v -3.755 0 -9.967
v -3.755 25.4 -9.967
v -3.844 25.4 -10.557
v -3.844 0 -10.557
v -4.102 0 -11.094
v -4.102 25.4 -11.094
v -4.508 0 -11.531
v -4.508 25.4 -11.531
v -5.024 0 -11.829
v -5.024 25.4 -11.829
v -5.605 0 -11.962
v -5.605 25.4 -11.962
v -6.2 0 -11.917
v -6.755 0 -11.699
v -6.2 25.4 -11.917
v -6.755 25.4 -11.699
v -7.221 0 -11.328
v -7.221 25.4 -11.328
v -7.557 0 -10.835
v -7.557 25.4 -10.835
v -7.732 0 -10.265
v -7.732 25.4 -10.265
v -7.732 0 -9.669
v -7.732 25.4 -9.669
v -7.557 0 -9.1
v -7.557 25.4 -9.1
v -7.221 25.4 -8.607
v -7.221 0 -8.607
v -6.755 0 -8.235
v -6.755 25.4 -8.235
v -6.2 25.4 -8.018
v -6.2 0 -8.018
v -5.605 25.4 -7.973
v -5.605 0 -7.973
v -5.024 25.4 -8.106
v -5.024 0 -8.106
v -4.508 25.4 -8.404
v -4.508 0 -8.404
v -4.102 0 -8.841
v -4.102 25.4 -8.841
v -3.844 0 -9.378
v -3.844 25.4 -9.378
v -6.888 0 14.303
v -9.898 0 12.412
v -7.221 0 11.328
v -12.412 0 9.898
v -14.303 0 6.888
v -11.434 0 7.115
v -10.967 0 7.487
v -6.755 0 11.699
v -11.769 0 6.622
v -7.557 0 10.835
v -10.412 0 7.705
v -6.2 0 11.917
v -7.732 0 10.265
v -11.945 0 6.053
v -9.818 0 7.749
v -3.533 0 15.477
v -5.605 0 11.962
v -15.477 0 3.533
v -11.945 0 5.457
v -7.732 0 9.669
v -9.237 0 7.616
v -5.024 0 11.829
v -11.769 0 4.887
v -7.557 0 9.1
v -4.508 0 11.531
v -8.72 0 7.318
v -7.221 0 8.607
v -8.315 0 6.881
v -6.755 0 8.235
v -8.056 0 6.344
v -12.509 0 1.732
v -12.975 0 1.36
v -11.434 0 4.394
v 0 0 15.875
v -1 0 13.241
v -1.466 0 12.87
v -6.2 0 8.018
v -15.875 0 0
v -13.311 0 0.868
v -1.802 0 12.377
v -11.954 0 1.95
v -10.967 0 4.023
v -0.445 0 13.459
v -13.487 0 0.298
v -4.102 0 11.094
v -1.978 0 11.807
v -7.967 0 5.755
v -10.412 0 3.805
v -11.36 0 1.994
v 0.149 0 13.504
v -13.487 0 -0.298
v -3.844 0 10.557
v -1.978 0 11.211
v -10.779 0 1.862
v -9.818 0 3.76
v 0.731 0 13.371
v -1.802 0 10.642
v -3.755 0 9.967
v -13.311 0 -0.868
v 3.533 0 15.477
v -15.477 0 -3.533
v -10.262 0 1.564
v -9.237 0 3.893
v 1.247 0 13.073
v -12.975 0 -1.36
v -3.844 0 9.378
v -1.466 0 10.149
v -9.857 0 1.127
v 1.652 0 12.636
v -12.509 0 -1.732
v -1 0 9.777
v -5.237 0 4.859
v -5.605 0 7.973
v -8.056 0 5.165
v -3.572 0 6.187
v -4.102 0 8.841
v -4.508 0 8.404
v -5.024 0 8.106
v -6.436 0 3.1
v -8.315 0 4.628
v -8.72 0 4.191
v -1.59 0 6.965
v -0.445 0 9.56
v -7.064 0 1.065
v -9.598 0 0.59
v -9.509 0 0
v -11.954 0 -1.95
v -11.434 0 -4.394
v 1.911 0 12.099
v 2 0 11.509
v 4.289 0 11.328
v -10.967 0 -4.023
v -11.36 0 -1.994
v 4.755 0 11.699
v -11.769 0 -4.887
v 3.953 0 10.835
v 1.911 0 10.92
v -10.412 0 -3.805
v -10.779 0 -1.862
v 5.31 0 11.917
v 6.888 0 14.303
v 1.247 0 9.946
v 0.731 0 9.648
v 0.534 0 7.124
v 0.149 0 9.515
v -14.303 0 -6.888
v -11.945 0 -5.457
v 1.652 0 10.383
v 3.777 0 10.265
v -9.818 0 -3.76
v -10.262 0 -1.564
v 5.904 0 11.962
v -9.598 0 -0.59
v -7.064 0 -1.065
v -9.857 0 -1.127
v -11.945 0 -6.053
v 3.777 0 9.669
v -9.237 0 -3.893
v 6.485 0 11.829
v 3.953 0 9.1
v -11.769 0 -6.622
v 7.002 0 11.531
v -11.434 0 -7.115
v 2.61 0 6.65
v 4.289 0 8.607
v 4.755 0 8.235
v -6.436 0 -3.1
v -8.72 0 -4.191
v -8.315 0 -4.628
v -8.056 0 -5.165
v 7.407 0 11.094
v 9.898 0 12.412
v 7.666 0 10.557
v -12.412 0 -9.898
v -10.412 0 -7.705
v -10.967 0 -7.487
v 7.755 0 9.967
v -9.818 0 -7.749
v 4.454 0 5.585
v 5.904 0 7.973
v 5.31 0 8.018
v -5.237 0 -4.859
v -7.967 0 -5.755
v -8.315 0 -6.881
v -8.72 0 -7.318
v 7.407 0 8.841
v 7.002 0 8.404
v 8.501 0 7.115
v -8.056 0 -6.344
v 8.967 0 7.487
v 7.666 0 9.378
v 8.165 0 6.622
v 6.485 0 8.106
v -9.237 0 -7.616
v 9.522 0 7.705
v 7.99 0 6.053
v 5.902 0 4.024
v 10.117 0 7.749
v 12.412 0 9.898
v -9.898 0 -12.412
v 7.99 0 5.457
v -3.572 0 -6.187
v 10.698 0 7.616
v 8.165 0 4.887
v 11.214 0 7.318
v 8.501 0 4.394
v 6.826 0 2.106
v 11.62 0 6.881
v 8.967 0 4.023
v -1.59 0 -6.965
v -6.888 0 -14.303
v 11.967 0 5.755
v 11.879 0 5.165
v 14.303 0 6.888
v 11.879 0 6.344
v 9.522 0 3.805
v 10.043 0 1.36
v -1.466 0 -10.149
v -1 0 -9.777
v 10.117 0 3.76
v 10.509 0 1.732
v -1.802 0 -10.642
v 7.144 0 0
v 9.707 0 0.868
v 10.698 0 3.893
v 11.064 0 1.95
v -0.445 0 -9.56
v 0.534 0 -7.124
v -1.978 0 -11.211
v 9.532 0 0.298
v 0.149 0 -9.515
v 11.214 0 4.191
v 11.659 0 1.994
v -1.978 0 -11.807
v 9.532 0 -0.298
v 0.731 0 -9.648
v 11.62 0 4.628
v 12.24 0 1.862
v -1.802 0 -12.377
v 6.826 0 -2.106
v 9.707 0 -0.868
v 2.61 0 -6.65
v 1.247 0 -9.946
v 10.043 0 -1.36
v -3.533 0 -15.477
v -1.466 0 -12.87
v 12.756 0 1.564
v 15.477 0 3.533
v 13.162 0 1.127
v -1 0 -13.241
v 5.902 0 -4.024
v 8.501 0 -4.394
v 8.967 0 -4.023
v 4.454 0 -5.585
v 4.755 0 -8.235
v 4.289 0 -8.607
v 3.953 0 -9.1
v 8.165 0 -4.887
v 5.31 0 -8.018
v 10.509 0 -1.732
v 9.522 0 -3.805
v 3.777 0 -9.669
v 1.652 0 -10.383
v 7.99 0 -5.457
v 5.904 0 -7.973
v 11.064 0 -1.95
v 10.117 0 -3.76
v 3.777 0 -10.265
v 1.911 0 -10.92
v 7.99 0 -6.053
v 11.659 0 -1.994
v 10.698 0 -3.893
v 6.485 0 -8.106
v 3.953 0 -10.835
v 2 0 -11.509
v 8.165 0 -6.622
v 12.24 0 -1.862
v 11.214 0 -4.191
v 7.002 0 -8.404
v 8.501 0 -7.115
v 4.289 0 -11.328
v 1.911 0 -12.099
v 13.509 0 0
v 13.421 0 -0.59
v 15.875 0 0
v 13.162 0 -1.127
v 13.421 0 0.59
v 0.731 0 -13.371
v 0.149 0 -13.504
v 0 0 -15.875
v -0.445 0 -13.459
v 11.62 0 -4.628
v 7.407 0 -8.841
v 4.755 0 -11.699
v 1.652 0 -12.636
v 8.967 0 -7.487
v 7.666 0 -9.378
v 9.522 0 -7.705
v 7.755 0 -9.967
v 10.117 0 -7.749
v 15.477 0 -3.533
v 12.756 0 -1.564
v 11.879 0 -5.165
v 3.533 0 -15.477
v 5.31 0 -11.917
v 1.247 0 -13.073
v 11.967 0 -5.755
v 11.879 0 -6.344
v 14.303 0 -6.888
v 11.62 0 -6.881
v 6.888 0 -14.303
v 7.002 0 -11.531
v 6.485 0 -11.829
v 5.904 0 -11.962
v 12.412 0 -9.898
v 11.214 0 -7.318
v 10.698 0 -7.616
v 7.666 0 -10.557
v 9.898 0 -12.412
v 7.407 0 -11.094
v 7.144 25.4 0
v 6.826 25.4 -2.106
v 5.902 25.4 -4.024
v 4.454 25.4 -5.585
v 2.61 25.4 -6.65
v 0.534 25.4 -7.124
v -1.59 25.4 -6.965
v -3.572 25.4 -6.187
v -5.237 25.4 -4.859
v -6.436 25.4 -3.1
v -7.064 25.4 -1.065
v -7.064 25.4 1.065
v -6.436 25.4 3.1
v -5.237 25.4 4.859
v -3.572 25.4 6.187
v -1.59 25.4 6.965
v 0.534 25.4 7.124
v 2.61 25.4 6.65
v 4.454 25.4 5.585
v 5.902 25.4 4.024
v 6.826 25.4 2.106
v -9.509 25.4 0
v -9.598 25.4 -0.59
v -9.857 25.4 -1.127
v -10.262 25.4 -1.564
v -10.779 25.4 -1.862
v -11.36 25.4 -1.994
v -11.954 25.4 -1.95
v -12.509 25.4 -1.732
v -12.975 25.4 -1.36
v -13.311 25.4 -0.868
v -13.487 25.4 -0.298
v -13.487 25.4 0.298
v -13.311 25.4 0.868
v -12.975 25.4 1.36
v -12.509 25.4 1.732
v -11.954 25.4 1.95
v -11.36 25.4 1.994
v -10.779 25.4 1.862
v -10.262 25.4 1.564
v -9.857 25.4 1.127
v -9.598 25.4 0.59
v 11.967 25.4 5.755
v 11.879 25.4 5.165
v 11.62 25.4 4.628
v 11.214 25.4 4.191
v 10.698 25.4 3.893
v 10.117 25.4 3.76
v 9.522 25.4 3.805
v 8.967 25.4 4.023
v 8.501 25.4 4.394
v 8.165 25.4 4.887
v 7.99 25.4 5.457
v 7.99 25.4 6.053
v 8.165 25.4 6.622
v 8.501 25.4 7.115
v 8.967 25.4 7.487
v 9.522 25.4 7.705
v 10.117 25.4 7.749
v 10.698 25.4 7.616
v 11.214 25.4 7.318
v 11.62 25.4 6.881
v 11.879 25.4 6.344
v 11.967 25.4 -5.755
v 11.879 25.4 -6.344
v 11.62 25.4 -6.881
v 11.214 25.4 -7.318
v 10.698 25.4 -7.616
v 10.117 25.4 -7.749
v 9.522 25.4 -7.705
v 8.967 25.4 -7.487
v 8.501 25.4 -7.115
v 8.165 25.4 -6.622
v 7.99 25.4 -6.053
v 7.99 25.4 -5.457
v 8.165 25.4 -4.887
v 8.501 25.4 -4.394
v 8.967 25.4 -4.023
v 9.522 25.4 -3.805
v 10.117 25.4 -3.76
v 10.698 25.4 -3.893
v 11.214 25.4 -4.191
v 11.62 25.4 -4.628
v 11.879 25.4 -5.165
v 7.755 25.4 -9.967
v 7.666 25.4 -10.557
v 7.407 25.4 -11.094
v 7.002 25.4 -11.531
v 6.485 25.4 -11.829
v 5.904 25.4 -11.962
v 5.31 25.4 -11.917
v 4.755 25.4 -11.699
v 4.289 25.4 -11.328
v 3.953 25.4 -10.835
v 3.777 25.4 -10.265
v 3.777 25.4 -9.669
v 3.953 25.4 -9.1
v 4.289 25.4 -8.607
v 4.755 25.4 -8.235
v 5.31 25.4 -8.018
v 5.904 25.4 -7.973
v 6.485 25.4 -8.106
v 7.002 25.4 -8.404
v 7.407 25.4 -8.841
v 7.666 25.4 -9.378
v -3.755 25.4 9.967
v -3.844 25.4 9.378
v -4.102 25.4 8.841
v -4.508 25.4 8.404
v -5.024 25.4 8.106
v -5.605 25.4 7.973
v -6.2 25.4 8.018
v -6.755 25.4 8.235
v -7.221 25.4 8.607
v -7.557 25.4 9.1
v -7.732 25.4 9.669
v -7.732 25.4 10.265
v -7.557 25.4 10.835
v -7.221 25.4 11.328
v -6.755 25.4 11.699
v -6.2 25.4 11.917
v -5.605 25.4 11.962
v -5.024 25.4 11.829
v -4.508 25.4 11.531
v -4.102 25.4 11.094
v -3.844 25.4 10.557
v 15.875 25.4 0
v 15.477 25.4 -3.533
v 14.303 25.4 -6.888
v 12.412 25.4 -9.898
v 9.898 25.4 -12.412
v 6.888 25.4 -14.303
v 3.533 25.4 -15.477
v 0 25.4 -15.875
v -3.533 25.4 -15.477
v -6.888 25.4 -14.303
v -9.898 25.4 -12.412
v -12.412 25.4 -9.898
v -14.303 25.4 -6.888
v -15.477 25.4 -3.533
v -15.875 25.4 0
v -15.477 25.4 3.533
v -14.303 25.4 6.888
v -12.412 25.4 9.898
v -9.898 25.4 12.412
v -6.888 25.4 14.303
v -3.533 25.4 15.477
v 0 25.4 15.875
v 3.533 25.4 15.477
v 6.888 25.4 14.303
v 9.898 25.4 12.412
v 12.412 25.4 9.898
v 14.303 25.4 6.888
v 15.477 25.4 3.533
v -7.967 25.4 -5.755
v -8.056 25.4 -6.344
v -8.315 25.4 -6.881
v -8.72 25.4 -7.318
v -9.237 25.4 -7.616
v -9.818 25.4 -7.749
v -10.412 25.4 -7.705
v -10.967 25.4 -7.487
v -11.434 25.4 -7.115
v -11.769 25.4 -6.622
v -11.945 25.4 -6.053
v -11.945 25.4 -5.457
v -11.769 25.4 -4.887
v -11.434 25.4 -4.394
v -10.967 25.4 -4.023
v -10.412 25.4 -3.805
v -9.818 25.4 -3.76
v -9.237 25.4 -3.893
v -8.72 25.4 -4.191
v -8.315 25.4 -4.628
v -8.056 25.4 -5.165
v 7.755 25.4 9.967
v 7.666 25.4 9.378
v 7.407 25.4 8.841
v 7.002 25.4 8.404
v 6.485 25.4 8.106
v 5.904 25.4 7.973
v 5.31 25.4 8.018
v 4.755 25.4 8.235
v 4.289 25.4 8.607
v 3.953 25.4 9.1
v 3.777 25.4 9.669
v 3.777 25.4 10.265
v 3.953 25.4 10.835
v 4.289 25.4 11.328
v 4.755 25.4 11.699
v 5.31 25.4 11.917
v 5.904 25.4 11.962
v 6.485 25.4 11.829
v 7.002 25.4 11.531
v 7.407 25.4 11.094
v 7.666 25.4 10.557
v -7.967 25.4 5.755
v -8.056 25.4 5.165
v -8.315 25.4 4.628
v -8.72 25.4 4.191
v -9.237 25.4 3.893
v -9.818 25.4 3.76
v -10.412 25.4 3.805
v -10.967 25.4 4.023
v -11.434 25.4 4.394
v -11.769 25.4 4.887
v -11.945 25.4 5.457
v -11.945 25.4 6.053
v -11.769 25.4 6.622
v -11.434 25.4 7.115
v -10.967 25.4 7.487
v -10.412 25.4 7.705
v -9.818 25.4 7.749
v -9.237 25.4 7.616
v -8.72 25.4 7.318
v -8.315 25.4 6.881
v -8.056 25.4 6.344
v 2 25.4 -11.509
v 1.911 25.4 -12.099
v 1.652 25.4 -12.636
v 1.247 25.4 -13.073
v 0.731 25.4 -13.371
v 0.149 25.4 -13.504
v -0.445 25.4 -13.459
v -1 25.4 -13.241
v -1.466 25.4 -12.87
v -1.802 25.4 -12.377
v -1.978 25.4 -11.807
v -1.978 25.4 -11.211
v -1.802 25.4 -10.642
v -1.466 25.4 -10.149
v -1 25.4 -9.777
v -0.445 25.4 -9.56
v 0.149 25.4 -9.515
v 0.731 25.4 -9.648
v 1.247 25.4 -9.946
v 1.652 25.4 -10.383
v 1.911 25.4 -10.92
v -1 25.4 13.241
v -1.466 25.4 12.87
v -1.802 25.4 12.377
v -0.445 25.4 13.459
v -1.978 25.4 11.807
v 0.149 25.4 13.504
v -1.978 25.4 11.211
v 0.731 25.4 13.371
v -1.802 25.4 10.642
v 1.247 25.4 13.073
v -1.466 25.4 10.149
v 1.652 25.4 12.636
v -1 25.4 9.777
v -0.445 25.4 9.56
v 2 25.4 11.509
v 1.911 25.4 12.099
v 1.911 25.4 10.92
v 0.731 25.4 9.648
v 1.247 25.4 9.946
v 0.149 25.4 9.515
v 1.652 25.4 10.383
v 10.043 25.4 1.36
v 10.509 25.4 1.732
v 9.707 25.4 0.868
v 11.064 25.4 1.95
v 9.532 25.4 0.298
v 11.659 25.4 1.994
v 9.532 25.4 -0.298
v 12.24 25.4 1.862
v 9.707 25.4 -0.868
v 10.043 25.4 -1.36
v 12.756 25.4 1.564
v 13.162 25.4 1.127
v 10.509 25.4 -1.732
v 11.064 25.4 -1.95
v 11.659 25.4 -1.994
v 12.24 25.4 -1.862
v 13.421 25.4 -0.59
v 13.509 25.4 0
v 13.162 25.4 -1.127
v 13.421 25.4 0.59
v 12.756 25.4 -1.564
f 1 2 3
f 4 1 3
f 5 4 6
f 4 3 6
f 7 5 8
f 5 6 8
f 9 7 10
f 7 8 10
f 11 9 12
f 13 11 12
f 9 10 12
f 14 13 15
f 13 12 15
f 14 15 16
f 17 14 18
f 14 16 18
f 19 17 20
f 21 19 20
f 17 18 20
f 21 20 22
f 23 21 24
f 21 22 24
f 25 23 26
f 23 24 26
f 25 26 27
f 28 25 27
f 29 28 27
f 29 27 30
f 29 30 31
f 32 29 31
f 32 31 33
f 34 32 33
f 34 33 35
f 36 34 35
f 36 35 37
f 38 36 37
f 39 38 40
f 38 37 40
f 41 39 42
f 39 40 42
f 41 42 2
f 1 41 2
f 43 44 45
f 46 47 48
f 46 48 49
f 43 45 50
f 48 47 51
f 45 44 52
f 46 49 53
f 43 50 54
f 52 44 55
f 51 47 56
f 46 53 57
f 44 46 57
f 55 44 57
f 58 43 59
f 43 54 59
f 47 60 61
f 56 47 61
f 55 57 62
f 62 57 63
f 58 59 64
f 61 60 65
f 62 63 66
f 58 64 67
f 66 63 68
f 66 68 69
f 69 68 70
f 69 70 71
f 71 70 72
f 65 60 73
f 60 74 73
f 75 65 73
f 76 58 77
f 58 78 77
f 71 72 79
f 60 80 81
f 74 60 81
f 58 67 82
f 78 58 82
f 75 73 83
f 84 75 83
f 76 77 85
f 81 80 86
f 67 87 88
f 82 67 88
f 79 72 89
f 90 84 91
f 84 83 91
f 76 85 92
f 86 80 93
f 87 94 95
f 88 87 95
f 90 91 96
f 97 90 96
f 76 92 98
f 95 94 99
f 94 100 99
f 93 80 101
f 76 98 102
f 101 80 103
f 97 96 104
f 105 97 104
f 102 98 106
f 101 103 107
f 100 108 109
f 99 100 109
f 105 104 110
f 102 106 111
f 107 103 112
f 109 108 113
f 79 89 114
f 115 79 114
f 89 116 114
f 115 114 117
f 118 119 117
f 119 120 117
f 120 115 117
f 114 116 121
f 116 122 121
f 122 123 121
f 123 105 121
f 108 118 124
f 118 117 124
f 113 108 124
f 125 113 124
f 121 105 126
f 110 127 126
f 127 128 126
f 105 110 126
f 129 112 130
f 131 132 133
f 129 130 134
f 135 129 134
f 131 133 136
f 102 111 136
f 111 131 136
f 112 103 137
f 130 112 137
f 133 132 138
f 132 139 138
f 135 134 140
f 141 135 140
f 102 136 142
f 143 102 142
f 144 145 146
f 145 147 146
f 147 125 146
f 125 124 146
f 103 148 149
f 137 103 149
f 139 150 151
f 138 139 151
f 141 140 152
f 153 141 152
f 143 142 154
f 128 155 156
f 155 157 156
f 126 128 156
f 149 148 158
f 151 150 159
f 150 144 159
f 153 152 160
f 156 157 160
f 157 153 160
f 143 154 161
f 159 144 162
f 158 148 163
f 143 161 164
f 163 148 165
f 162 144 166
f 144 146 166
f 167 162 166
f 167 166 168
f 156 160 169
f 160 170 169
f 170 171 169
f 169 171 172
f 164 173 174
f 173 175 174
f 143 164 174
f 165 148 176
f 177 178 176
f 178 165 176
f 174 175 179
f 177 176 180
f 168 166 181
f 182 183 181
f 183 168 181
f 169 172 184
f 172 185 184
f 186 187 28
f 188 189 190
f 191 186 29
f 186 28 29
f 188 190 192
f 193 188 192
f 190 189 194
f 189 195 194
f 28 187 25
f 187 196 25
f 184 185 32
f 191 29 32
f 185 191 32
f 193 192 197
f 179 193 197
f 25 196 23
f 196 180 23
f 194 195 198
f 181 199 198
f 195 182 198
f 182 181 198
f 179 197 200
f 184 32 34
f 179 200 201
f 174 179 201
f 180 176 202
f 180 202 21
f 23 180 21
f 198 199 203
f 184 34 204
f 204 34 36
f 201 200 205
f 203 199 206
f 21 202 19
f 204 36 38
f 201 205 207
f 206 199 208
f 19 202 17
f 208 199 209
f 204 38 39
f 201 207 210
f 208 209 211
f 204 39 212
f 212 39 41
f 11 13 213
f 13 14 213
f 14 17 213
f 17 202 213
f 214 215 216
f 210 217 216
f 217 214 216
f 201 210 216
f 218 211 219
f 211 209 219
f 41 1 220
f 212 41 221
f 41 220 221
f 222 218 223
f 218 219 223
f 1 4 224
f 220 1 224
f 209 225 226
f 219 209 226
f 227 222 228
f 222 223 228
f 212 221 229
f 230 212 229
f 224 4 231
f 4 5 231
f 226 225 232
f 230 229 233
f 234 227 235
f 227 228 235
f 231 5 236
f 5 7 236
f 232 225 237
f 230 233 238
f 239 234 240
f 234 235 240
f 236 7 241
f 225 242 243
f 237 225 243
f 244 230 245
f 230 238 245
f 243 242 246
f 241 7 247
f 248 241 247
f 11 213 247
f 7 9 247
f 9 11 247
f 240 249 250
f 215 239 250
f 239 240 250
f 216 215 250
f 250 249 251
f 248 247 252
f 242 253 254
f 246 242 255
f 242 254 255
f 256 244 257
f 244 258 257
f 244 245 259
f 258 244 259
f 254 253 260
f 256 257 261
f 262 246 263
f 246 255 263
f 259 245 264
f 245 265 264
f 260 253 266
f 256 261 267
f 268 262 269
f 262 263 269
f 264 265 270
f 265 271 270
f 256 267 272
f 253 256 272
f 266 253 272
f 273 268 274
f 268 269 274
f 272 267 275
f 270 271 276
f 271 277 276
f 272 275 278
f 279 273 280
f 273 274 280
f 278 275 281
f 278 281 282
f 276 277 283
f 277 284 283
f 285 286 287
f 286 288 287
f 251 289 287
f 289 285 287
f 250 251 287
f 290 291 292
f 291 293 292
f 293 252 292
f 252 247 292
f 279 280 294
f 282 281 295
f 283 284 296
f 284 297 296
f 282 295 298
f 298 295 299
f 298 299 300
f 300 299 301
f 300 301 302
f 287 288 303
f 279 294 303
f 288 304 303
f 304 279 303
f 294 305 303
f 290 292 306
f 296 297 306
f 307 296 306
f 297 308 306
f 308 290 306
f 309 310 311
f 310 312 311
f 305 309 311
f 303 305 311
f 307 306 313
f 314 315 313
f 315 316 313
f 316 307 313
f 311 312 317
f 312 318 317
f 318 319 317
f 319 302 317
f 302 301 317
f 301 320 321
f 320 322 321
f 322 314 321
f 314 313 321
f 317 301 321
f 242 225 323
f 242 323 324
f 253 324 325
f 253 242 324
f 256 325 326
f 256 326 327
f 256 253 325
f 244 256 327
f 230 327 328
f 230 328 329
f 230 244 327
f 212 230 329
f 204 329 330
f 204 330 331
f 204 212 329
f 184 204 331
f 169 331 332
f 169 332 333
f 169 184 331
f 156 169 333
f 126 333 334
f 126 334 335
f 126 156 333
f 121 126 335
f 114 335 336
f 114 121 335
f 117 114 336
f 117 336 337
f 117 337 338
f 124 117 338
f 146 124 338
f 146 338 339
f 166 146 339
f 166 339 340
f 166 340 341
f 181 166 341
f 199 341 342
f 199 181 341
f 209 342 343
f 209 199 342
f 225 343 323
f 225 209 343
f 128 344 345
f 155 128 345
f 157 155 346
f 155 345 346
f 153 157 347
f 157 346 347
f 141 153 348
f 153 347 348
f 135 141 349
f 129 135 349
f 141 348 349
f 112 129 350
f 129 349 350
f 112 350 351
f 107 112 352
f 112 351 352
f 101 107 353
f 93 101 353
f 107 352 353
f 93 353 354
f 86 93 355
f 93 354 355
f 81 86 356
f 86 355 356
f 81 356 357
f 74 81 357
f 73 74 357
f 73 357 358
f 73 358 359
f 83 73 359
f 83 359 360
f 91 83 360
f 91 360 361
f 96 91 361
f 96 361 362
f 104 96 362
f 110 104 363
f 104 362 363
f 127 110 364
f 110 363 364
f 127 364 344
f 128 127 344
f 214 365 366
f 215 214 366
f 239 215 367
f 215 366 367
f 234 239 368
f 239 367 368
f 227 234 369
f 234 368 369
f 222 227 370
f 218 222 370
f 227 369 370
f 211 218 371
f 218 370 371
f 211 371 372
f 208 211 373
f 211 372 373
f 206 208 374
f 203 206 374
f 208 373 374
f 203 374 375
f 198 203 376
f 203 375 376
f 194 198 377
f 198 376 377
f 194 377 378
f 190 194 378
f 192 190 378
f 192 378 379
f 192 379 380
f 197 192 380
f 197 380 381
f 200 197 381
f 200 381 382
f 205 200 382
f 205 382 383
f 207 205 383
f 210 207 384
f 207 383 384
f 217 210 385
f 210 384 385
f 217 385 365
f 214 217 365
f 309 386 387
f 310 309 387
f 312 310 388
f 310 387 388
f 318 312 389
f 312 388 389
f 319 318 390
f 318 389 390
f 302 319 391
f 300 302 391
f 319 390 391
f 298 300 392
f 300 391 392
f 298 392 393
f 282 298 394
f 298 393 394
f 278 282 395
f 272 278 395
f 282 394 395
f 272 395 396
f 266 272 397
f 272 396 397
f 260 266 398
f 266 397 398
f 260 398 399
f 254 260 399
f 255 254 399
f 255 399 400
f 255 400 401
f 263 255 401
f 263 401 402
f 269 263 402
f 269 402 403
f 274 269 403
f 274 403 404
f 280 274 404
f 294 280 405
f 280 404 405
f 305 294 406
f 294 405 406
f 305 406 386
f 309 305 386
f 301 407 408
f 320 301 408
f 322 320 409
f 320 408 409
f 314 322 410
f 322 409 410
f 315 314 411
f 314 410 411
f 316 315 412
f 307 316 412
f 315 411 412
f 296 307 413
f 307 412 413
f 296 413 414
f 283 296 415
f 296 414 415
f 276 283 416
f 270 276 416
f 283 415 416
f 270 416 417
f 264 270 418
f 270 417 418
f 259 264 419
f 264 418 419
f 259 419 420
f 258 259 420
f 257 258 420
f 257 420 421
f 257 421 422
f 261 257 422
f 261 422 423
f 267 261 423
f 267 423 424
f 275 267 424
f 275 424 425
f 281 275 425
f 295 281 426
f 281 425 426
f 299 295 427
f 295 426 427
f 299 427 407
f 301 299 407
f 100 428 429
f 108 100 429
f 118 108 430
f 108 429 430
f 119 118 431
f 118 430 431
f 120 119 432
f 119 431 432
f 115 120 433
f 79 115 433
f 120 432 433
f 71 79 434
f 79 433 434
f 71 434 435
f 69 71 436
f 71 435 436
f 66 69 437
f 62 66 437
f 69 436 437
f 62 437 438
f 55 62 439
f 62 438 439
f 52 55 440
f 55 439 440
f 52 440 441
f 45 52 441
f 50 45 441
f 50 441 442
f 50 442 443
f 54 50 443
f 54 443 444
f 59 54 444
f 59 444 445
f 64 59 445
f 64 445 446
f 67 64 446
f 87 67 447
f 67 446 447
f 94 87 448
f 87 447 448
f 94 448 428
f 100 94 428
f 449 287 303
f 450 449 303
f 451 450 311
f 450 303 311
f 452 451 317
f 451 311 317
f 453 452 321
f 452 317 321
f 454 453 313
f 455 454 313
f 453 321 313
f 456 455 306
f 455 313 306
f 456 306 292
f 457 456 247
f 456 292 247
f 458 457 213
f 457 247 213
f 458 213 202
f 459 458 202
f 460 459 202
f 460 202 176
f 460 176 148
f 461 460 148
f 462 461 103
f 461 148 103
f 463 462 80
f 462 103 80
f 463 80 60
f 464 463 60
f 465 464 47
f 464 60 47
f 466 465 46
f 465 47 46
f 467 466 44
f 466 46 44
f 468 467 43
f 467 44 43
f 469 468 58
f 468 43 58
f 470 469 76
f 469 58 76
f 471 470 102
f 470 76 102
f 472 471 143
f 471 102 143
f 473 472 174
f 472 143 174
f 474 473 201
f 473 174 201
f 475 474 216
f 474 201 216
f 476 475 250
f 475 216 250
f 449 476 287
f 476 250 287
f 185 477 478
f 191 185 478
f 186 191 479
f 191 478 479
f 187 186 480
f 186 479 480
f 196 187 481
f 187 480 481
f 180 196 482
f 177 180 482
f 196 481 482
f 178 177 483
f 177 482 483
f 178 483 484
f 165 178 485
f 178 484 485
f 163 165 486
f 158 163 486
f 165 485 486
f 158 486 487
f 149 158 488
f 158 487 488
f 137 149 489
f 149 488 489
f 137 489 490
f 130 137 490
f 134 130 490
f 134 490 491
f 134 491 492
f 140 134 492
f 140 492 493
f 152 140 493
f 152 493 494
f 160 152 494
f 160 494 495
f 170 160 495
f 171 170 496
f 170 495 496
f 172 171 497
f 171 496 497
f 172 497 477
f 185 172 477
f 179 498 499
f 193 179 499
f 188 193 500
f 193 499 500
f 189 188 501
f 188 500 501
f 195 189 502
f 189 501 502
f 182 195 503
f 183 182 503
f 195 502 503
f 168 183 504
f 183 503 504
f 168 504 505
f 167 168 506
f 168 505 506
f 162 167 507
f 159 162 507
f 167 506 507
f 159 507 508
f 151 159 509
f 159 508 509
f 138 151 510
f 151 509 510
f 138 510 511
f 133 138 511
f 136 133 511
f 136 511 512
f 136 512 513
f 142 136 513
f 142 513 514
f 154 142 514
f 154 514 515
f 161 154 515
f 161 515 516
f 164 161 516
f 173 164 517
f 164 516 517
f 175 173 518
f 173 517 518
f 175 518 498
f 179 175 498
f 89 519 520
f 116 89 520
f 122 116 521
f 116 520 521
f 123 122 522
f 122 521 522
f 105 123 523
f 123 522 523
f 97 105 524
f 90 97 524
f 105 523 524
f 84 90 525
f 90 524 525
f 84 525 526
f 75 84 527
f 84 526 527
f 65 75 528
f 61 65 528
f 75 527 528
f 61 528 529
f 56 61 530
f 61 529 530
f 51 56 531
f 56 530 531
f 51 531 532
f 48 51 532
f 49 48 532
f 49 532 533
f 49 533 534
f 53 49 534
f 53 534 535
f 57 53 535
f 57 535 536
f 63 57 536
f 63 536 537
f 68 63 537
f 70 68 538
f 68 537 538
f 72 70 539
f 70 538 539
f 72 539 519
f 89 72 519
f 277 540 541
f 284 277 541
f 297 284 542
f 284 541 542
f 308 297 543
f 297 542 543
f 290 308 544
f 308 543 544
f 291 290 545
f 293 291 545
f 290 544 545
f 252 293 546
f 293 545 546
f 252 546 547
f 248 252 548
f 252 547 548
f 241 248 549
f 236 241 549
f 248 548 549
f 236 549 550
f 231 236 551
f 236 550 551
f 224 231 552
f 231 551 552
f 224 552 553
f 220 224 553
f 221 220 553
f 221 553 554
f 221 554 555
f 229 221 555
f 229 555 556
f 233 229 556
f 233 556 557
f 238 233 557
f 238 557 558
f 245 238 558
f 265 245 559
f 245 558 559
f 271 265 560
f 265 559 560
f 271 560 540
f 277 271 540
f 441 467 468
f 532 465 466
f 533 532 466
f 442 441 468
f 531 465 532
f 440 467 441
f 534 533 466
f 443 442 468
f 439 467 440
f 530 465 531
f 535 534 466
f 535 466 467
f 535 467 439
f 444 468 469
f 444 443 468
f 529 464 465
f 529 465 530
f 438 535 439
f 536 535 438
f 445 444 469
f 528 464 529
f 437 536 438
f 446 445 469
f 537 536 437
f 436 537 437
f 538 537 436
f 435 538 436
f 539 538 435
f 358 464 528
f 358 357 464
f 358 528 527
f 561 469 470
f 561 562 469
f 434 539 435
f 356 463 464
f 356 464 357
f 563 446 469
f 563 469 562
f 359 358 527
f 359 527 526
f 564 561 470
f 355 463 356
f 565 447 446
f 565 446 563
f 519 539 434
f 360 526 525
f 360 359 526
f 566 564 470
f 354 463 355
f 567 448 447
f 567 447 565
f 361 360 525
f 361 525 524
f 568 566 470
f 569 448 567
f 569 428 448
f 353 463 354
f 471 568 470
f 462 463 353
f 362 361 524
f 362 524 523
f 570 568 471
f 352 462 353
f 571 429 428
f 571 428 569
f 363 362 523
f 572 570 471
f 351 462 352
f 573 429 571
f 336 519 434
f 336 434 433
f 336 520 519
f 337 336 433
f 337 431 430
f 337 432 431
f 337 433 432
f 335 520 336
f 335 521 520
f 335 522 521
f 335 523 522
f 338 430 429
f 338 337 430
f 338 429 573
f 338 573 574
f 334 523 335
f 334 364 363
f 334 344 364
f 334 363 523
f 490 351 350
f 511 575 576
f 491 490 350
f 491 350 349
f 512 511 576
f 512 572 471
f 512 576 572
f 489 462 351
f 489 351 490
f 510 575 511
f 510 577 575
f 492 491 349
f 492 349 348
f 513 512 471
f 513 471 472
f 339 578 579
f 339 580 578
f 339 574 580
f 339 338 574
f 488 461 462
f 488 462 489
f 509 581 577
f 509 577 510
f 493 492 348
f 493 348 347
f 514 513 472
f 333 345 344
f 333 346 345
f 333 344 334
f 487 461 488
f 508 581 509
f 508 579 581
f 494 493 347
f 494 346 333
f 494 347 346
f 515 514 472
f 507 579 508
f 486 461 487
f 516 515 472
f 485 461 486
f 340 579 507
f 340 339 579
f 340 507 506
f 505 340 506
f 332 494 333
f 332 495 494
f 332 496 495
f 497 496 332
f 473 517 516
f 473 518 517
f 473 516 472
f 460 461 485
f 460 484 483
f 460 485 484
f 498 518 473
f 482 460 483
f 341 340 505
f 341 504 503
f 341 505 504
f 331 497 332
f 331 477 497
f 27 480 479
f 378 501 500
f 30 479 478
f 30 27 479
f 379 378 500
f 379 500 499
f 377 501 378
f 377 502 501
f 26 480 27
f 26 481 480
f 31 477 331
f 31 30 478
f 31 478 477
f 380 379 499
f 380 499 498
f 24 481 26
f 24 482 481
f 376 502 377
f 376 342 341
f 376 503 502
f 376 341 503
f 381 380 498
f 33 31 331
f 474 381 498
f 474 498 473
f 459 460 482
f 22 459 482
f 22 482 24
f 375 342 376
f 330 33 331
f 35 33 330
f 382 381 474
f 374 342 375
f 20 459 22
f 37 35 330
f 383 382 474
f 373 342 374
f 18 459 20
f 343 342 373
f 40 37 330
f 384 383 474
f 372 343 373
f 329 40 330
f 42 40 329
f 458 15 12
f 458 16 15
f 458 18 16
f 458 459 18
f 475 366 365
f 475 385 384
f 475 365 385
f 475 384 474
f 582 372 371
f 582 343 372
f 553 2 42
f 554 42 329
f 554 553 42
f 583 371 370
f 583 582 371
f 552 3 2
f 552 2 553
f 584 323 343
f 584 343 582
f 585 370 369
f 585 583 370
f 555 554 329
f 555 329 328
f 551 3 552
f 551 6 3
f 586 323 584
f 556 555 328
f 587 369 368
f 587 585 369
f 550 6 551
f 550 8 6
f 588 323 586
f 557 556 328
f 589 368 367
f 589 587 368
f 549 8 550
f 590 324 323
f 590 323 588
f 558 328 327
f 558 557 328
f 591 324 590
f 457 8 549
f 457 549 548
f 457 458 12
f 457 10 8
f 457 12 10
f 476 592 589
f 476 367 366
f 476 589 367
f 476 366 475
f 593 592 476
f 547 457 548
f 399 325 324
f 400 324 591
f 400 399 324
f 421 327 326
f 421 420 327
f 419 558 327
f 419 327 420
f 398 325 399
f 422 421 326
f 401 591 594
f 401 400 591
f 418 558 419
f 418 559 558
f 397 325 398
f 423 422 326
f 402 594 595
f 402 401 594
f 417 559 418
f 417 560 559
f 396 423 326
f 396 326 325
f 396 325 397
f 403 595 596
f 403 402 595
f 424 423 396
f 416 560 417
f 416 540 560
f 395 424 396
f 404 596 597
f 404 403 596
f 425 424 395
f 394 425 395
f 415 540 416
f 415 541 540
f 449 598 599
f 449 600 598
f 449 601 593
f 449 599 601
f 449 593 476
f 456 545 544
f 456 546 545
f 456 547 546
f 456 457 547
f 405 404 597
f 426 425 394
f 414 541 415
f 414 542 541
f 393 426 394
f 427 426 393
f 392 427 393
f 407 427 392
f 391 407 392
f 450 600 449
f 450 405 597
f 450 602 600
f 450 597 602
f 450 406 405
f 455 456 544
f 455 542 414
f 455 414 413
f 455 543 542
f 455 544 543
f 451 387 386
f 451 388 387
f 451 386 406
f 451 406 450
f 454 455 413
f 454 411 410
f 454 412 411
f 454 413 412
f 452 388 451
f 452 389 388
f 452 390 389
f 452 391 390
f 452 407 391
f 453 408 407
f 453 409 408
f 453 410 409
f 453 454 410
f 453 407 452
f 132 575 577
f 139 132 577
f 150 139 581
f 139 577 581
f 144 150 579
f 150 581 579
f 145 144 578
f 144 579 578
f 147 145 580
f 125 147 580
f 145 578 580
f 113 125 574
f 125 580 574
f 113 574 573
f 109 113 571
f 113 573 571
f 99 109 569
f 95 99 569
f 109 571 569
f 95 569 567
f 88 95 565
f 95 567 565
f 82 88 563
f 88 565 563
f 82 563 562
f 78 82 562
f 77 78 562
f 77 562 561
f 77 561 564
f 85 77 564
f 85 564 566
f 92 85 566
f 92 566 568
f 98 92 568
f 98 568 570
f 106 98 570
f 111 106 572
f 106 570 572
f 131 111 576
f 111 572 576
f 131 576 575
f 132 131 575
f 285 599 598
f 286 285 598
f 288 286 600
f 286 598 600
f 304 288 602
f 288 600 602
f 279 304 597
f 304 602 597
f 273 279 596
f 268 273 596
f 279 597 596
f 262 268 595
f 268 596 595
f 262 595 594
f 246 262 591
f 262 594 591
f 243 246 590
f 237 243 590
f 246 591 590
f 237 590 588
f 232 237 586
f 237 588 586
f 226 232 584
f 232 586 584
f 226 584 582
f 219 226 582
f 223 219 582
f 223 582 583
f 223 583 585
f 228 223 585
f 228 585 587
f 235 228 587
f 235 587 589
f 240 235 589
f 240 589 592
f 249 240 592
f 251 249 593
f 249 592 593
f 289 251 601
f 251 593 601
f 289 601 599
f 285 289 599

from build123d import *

# Parameters (mm, degrees)
SKETCH_1_R          = 15.875
SKETCH_1_R_2        = 7.14375
EXTRUDE_1_DEPTH     = 25.4
SKETCH_2_R          = 2
CUT_EXTRUDE_1_DEPTH = 25.4


with BuildPart() as part:
    # 스케치1 → 보스-돌출1 (new body)
    with BuildSketch(Plane(origin=(0, 0, 0), x_dir=(1, 0, 0), z_dir=(0, 1, 0))):
        Circle(SKETCH_1_R)
        Circle(SKETCH_1_R_2, mode=Mode.SUBTRACT)
    extrude(amount=EXTRUDE_1_DEPTH)

    # 스케치2 → 컷-돌출1 (cut)
    with BuildSketch(Plane(origin=(0, 25.4, 0), x_dir=(1, 0, 0), z_dir=(0, 1, 0))):
        with Locations((0, 11.509375)):
            Circle(SKETCH_2_R)
        with Locations((5.7546875, 9.967411132)):
            Circle(SKETCH_2_R)
        with Locations((9.967411132, 5.7546875)):
            Circle(SKETCH_2_R)
        with Locations((11.509375, 0)):
            Circle(SKETCH_2_R)
        with Locations((9.967411132, -5.7546875)):
            Circle(SKETCH_2_R)
        with Locations((5.7546875, -9.967411132)):
            Circle(SKETCH_2_R)
        with Locations((0, -11.509375)):
            Circle(SKETCH_2_R)
        with Locations((-5.7546875, -9.967411132)):
            Circle(SKETCH_2_R)
        with Locations((-9.967411132, -5.7546875)):
            Circle(SKETCH_2_R)
        with Locations((-11.509375, 0)):
            Circle(SKETCH_2_R)
        with Locations((-9.967411132, 5.7546875)):
            Circle(SKETCH_2_R)
        with Locations((-5.7546875, 9.967411132)):
            Circle(SKETCH_2_R)
    extrude(amount=-CUT_EXTRUDE_1_DEPTH, mode=Mode.SUBTRACT)


solid = part.part
